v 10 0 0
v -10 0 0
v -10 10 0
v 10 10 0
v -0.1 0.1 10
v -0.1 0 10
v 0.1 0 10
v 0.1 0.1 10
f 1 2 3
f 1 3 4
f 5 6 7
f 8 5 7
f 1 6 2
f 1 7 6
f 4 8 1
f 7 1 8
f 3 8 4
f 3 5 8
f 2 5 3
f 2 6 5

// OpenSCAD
$fn=20;

//THIS IS AN EXAMPLE FILE FOR PIPELINE TEST. We Will update it with real code later

// Create a half-pyramid from a single linear extrusion
module halfpyramid(base, height) {
   linear_extrude(height, scale=0.01)
      translate([-base/2, 0, 0]) square([base, base/2]);
}

halfpyramid(20, 10);
